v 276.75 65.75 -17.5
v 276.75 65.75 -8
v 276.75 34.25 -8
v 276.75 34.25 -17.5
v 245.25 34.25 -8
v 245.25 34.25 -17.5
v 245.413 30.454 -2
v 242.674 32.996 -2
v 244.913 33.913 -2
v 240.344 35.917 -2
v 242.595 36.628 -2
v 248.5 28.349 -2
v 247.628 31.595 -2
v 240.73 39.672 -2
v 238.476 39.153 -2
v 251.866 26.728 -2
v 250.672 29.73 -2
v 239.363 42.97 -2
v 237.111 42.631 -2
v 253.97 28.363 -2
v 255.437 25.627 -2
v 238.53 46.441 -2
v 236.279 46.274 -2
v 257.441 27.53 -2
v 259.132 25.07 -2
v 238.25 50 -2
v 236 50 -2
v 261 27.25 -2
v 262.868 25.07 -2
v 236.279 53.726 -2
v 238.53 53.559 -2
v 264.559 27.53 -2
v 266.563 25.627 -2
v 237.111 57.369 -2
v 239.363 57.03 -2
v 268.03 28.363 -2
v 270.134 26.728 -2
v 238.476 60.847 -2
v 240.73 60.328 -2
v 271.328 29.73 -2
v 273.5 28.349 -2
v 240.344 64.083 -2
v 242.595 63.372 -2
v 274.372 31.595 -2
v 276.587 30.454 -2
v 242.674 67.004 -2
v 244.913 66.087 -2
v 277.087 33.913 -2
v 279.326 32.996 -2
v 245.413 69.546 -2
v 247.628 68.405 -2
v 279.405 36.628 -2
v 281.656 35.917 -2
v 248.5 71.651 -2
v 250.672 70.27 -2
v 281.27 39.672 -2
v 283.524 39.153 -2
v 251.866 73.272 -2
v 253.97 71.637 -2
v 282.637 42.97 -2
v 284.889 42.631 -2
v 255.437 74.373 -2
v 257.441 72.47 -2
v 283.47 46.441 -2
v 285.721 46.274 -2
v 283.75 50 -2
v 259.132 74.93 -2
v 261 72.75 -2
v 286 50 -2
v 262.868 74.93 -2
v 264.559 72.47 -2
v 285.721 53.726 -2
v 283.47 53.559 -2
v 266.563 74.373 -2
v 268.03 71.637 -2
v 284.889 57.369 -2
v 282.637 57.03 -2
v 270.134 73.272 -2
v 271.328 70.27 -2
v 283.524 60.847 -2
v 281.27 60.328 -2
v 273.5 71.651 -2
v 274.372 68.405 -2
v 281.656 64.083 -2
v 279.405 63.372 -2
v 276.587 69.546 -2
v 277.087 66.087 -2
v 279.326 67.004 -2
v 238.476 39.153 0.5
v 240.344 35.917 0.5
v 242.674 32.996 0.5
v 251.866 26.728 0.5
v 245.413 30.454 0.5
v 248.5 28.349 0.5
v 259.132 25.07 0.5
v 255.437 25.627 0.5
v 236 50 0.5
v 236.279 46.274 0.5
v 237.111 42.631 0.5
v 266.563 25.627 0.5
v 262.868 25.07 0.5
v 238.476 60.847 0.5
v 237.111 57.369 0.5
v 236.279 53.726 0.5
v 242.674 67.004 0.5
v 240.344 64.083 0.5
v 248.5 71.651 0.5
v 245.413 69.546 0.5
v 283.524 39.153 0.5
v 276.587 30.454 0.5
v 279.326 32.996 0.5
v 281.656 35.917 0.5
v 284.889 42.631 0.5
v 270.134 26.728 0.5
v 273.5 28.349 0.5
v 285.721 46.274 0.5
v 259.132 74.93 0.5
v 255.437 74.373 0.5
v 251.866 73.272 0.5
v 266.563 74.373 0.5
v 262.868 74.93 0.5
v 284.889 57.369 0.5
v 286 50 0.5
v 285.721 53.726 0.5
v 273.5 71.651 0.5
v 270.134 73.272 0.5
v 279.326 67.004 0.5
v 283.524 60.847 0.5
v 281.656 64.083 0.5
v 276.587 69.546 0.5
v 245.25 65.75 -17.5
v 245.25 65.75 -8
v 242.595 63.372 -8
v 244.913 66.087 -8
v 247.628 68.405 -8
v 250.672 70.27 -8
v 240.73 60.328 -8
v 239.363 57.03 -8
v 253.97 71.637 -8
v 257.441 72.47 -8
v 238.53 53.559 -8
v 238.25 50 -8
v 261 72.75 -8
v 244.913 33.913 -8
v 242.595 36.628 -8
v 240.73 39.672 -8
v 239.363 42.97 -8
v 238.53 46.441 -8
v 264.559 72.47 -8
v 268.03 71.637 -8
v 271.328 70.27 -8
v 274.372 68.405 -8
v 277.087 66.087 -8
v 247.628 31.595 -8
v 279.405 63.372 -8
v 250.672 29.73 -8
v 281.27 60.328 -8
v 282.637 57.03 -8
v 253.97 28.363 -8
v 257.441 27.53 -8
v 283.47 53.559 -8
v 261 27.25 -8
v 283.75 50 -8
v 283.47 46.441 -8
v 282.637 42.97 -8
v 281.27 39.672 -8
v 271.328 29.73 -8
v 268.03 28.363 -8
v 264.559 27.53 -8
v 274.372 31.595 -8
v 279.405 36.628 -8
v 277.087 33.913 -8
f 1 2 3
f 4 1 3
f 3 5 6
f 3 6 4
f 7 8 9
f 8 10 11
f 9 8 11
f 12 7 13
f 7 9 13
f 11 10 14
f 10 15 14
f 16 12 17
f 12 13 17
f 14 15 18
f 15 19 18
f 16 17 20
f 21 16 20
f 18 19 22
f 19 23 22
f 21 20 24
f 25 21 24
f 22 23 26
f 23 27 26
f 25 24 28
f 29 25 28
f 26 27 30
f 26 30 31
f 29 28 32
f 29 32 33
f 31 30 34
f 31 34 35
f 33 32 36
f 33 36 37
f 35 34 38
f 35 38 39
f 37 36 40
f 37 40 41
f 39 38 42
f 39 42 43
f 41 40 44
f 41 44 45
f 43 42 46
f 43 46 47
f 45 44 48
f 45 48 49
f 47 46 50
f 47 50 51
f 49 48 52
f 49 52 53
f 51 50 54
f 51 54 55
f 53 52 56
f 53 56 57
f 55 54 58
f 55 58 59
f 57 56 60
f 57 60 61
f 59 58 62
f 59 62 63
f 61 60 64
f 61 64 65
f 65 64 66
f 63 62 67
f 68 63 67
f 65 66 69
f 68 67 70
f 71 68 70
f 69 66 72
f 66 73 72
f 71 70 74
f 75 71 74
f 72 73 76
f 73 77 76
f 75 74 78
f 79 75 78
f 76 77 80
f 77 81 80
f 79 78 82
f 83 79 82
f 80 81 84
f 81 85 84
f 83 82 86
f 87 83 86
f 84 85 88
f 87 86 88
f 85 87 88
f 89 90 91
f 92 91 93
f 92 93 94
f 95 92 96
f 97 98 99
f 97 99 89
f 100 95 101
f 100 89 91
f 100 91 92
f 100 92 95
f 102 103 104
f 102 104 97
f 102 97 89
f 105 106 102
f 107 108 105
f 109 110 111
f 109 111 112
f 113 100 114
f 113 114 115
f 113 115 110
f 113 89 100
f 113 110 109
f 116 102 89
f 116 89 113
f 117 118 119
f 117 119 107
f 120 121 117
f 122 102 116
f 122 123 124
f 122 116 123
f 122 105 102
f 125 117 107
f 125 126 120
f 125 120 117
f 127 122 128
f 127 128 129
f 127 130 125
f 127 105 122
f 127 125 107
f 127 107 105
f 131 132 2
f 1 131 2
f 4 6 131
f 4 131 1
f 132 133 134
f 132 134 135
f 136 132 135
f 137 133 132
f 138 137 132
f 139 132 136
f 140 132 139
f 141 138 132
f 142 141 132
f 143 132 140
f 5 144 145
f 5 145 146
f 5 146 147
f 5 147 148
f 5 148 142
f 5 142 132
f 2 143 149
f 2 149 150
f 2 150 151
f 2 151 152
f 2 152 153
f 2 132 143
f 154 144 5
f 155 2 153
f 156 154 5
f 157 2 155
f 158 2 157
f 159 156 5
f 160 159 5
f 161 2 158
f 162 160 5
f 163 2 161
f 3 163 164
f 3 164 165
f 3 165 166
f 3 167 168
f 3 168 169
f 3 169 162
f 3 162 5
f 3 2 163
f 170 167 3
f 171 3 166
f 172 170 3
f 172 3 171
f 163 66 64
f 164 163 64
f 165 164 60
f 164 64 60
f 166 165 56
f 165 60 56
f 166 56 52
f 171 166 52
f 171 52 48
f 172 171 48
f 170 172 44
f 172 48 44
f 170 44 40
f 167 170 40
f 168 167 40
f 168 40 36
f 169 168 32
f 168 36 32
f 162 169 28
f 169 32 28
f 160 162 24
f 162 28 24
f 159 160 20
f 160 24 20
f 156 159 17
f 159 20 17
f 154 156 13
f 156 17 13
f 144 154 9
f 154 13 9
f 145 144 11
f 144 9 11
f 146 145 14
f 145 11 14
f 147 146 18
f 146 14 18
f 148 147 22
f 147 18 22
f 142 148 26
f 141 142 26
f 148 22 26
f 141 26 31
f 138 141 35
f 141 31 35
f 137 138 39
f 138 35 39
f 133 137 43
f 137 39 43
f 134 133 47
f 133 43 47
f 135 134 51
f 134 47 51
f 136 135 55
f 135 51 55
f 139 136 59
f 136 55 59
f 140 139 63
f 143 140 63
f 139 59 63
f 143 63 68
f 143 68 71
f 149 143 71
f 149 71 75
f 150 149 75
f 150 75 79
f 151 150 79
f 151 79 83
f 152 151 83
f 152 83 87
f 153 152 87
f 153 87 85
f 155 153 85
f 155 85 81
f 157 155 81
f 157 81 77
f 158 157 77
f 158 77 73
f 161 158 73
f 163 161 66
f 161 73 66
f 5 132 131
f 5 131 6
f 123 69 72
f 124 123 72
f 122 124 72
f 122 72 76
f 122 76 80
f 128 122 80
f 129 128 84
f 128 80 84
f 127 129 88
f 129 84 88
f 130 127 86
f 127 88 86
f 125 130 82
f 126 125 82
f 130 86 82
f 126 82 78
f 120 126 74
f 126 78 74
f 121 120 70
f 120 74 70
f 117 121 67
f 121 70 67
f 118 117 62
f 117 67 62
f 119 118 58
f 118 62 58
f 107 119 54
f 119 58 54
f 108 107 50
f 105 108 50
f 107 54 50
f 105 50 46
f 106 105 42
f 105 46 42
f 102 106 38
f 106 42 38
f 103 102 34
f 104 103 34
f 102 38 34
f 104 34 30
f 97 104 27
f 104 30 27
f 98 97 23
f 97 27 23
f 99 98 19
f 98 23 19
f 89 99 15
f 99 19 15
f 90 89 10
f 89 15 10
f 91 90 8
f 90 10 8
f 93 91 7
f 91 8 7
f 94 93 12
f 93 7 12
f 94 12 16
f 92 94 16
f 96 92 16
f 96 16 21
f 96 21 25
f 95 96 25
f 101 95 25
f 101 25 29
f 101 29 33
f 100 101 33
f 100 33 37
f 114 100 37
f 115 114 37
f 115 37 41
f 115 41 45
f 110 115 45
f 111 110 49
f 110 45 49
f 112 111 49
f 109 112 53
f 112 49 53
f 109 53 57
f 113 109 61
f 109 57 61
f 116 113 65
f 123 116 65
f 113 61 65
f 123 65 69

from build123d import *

# Parameters (mm, degrees)
SKETCH045_R  = 25
PAD017_DEPTH = 2.5
SKETCH046_R  = 22.75
PAD018_DEPTH = 6
SKETCH047_W  = 31.5
SKETCH047_H  = 31.5
PAD019_DEPTH = 9.5


with BuildPart() as part:
    # Sketch045 → Pad017 (new body)
    with BuildSketch(Plane.XY):
        Circle(SKETCH045_R)
    extrude(amount=PAD017_DEPTH)

    # Sketch046 (on Face2 of Pad017) → Pad018 (join)
    with BuildSketch(Plane(origin=(0, 0, 0), x_dir=(1, 0, 0), z_dir=(0, 0, -1))):
        Circle(SKETCH046_R)
    extrude(amount=PAD018_DEPTH)

    # Sketch047 (on Face5 of Pad018) → Pad019 (join)
    with BuildSketch(Plane(origin=(0, 0, -6), x_dir=(1, 0, 0), z_dir=(0, 0, -1))):
        Rectangle(SKETCH047_W, SKETCH047_H)
    extrude(amount=PAD019_DEPTH)


with BuildPart() as part_1:
    # Body009 placement: moved
    add(part.part.moved(Location((261, 50, -2))))


solid = part_1.part
